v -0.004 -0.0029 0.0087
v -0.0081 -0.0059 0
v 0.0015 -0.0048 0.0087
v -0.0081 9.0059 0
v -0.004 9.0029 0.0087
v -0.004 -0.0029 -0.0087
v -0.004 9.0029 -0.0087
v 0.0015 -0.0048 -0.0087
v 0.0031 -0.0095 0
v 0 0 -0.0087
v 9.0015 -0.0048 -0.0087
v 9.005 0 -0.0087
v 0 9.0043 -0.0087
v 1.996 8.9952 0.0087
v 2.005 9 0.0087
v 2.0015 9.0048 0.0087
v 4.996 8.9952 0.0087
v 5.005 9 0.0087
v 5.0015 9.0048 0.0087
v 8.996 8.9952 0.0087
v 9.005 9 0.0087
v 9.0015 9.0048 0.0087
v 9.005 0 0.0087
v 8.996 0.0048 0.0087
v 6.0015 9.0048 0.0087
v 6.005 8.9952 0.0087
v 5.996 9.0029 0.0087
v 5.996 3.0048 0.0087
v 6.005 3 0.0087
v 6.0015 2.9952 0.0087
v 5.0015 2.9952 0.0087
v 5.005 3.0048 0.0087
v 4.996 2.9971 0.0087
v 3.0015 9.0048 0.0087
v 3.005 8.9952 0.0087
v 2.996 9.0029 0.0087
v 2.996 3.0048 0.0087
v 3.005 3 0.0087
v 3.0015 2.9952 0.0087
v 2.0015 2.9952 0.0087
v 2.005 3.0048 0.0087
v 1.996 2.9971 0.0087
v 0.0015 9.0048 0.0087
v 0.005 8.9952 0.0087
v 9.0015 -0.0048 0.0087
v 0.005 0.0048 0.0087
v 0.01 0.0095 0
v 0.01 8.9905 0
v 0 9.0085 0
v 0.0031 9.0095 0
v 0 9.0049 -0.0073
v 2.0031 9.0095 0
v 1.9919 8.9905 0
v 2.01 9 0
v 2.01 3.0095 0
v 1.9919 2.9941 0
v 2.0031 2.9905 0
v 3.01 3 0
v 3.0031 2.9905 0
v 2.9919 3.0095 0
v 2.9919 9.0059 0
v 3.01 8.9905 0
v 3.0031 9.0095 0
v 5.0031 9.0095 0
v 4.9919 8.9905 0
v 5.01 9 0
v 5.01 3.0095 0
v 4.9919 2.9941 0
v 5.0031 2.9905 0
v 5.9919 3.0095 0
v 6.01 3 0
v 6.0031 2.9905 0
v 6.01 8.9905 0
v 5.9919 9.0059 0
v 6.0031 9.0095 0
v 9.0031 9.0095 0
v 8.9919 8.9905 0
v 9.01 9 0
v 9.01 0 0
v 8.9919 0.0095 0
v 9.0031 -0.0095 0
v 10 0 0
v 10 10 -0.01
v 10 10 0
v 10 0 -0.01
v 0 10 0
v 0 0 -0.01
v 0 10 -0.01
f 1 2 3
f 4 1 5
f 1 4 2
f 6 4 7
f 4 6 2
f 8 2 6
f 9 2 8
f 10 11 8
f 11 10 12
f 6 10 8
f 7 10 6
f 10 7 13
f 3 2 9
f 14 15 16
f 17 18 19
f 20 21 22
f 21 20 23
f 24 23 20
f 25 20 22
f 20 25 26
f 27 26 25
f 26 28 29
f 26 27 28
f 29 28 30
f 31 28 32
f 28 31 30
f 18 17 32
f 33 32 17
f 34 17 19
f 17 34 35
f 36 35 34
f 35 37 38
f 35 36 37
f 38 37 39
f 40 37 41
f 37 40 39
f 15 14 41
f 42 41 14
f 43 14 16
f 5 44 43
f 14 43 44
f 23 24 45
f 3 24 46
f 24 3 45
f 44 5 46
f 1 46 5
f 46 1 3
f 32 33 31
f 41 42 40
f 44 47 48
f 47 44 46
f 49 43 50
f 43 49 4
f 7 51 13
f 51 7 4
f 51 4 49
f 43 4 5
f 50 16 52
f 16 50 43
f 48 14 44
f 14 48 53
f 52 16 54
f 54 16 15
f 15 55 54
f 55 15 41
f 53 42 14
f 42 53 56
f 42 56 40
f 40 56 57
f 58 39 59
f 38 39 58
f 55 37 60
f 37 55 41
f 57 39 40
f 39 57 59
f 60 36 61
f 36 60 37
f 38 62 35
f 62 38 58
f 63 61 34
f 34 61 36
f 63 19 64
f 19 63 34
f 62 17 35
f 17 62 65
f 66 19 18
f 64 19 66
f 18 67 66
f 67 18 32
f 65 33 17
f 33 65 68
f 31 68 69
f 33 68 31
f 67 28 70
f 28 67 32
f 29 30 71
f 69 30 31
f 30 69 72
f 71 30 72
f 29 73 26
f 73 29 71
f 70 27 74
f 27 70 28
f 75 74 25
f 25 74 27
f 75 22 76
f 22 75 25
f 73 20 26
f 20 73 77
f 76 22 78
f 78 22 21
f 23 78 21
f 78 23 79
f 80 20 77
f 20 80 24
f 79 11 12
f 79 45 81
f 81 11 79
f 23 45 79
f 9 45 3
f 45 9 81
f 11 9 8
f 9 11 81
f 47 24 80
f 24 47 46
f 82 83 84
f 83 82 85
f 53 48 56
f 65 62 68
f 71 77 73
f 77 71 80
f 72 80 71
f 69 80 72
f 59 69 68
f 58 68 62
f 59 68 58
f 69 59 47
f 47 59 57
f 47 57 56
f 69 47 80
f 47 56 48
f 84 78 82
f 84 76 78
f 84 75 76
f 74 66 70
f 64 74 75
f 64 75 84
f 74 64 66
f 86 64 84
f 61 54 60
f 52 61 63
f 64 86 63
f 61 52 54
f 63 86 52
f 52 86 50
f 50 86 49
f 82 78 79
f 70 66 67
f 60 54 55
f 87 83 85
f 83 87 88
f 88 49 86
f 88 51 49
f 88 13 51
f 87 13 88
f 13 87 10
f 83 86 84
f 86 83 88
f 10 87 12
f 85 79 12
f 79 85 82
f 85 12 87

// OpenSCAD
hull(){
    translate([0, 0]) sphere(0.01);
    translate([0, 1]) sphere(0.01);
}
hull(){
    translate([0, 1]) sphere(0.01);
    translate([0, 2]) sphere(0.01);
}
hull(){
    translate([0, 2]) sphere(0.01);
    translate([0, 3]) sphere(0.01);
}
hull(){
    translate([0, 3]) sphere(0.01);
    translate([0, 4]) sphere(0.01);
}
hull(){
    translate([0, 4]) sphere(0.01);
    translate([0, 5]) sphere(0.01);
}
hull(){
    translate([0, 5]) sphere(0.01);
    translate([0, 6]) sphere(0.01);
}
hull(){
    translate([0, 6]) sphere(0.01);
    translate([0, 7]) sphere(0.01);
}
hull(){
    translate([0, 7]) sphere(0.01);
    translate([0, 8]) sphere(0.01);
}
hull(){
    translate([0, 8]) sphere(0.01);
    translate([0, 9]) sphere(0.01);
}
hull(){
    translate([0, 9]) sphere(0.01);
    translate([1, 9]) sphere(0.01);
}
hull(){
    translate([1, 9]) sphere(0.01);
    translate([2, 9]) sphere(0.01);
}
hull(){
    translate([2, 9]) sphere(0.01);
    translate([2, 8]) sphere(0.01);
}
hull(){
    translate([2, 8]) sphere(0.01);
    translate([2, 7]) sphere(0.01);
}
hull(){
    translate([2, 7]) sphere(0.01);
    translate([2, 6]) sphere(0.01);
}
hull(){
    translate([2, 6]) sphere(0.01);
    translate([2, 5]) sphere(0.01);
}
hull(){
    translate([2, 5]) sphere(0.01);
    translate([2, 4]) sphere(0.01);
}
hull(){
    translate([2, 4]) sphere(0.01);
    translate([2, 3]) sphere(0.01);
}
hull(){
    translate([2, 3]) sphere(0.01);
    translate([3, 3]) sphere(0.01);
}
hull(){
    translate([3, 3]) sphere(0.01);
    translate([3, 4]) sphere(0.01);
}
hull(){
    translate([3, 4]) sphere(0.01);
    translate([3, 5]) sphere(0.01);
}
hull(){
    translate([3, 5]) sphere(0.01);
    translate([3, 6]) sphere(0.01);
}
hull(){
    translate([3, 6]) sphere(0.01);
    translate([3, 7]) sphere(0.01);
}
hull(){
    translate([3, 7]) sphere(0.01);
    translate([3, 8]) sphere(0.01);
}
hull(){
    translate([3, 8]) sphere(0.01);
    translate([3, 9]) sphere(0.01);
}
hull(){
    translate([3, 9]) sphere(0.01);
    translate([4, 9]) sphere(0.01);
}
hull(){
    translate([4, 9]) sphere(0.01);
    translate([5, 9]) sphere(0.01);
}
hull(){
    translate([5, 9]) sphere(0.01);
    translate([5, 8]) sphere(0.01);
}
hull(){
    translate([5, 8]) sphere(0.01);
    translate([5, 7]) sphere(0.01);
}
hull(){
    translate([5, 7]) sphere(0.01);
    translate([5, 6]) sphere(0.01);
}
hull(){
    translate([5, 6]) sphere(0.01);
    translate([5, 5]) sphere(0.01);
}
hull(){
    translate([5, 5]) sphere(0.01);
    translate([5, 4]) sphere(0.01);
}
hull(){
    translate([5, 4]) sphere(0.01);
    translate([5, 3]) sphere(0.01);
}
hull(){
    translate([5, 3]) sphere(0.01);
    translate([6, 3]) sphere(0.01);
}
hull(){
    translate([6, 3]) sphere(0.01);
    translate([6, 4]) sphere(0.01);
}
hull(){
    translate([6, 4]) sphere(0.01);
    translate([6, 5]) sphere(0.01);
}
hull(){
    translate([6, 5]) sphere(0.01);
    translate([6, 6]) sphere(0.01);
}
hull(){
    translate([6, 6]) sphere(0.01);
    translate([6, 7]) sphere(0.01);
}
hull(){
    translate([6, 7]) sphere(0.01);
    translate([6, 8]) sphere(0.01);
}
hull(){
    translate([6, 8]) sphere(0.01);
    translate([6, 9]) sphere(0.01);
}
hull(){
    translate([6, 9]) sphere(0.01);
    translate([7, 9]) sphere(0.01);
}
hull(){
    translate([7, 9]) sphere(0.01);
    translate([8, 9]) sphere(0.01);
}
hull(){
    translate([8, 9]) sphere(0.01);
    translate([9, 9]) sphere(0.01);
}
hull(){
    translate([9, 9]) sphere(0.01);
    translate([9, 8]) sphere(0.01);
}
hull(){
    translate([9, 8]) sphere(0.01);
    translate([9, 7]) sphere(0.01);
}
hull(){
    translate([9, 7]) sphere(0.01);
    translate([9, 6]) sphere(0.01);
}
hull(){
    translate([9, 6]) sphere(0.01);
    translate([9, 5]) sphere(0.01);
}
hull(){
    translate([9, 5]) sphere(0.01);
    translate([9, 4]) sphere(0.01);
}
hull(){
    translate([9, 4]) sphere(0.01);
    translate([9, 3]) sphere(0.01);
}
hull(){
    translate([9, 3]) sphere(0.01);
    translate([9, 2]) sphere(0.01);
}
hull(){
    translate([9, 2]) sphere(0.01);
    translate([9, 1]) sphere(0.01);
}
hull(){
    translate([9, 1]) sphere(0.01);
    translate([9, 0]) sphere(0.01);
}
hull(){
    translate([9, 0]) sphere(0.01);
    translate([8, 0]) sphere(0.01);
}
hull(){
    translate([8, 0]) sphere(0.01);
    translate([7, 0]) sphere(0.01);
}
hull(){
    translate([7, 0]) sphere(0.01);
    translate([6, 0]) sphere(0.01);
}
hull(){
    translate([6, 0]) sphere(0.01);
    translate([5, 0]) sphere(0.01);
}
hull(){
    translate([5, 0]) sphere(0.01);
    translate([4, 0]) sphere(0.01);
}
hull(){
    translate([4, 0]) sphere(0.01);
    translate([3, 0]) sphere(0.01);
}
hull(){
    translate([3, 0]) sphere(0.01);
    translate([2, 0]) sphere(0.01);
}
hull(){
    translate([2, 0]) sphere(0.01);
    translate([1, 0]) sphere(0.01);
}
hull(){
    translate([1, 0]) sphere(0.01);
    translate([0, 0]) sphere(0.01);
}
translate([0,0,-0.01]) color([0.1,0.1,0.1]) cube([10,10,0.01]);
